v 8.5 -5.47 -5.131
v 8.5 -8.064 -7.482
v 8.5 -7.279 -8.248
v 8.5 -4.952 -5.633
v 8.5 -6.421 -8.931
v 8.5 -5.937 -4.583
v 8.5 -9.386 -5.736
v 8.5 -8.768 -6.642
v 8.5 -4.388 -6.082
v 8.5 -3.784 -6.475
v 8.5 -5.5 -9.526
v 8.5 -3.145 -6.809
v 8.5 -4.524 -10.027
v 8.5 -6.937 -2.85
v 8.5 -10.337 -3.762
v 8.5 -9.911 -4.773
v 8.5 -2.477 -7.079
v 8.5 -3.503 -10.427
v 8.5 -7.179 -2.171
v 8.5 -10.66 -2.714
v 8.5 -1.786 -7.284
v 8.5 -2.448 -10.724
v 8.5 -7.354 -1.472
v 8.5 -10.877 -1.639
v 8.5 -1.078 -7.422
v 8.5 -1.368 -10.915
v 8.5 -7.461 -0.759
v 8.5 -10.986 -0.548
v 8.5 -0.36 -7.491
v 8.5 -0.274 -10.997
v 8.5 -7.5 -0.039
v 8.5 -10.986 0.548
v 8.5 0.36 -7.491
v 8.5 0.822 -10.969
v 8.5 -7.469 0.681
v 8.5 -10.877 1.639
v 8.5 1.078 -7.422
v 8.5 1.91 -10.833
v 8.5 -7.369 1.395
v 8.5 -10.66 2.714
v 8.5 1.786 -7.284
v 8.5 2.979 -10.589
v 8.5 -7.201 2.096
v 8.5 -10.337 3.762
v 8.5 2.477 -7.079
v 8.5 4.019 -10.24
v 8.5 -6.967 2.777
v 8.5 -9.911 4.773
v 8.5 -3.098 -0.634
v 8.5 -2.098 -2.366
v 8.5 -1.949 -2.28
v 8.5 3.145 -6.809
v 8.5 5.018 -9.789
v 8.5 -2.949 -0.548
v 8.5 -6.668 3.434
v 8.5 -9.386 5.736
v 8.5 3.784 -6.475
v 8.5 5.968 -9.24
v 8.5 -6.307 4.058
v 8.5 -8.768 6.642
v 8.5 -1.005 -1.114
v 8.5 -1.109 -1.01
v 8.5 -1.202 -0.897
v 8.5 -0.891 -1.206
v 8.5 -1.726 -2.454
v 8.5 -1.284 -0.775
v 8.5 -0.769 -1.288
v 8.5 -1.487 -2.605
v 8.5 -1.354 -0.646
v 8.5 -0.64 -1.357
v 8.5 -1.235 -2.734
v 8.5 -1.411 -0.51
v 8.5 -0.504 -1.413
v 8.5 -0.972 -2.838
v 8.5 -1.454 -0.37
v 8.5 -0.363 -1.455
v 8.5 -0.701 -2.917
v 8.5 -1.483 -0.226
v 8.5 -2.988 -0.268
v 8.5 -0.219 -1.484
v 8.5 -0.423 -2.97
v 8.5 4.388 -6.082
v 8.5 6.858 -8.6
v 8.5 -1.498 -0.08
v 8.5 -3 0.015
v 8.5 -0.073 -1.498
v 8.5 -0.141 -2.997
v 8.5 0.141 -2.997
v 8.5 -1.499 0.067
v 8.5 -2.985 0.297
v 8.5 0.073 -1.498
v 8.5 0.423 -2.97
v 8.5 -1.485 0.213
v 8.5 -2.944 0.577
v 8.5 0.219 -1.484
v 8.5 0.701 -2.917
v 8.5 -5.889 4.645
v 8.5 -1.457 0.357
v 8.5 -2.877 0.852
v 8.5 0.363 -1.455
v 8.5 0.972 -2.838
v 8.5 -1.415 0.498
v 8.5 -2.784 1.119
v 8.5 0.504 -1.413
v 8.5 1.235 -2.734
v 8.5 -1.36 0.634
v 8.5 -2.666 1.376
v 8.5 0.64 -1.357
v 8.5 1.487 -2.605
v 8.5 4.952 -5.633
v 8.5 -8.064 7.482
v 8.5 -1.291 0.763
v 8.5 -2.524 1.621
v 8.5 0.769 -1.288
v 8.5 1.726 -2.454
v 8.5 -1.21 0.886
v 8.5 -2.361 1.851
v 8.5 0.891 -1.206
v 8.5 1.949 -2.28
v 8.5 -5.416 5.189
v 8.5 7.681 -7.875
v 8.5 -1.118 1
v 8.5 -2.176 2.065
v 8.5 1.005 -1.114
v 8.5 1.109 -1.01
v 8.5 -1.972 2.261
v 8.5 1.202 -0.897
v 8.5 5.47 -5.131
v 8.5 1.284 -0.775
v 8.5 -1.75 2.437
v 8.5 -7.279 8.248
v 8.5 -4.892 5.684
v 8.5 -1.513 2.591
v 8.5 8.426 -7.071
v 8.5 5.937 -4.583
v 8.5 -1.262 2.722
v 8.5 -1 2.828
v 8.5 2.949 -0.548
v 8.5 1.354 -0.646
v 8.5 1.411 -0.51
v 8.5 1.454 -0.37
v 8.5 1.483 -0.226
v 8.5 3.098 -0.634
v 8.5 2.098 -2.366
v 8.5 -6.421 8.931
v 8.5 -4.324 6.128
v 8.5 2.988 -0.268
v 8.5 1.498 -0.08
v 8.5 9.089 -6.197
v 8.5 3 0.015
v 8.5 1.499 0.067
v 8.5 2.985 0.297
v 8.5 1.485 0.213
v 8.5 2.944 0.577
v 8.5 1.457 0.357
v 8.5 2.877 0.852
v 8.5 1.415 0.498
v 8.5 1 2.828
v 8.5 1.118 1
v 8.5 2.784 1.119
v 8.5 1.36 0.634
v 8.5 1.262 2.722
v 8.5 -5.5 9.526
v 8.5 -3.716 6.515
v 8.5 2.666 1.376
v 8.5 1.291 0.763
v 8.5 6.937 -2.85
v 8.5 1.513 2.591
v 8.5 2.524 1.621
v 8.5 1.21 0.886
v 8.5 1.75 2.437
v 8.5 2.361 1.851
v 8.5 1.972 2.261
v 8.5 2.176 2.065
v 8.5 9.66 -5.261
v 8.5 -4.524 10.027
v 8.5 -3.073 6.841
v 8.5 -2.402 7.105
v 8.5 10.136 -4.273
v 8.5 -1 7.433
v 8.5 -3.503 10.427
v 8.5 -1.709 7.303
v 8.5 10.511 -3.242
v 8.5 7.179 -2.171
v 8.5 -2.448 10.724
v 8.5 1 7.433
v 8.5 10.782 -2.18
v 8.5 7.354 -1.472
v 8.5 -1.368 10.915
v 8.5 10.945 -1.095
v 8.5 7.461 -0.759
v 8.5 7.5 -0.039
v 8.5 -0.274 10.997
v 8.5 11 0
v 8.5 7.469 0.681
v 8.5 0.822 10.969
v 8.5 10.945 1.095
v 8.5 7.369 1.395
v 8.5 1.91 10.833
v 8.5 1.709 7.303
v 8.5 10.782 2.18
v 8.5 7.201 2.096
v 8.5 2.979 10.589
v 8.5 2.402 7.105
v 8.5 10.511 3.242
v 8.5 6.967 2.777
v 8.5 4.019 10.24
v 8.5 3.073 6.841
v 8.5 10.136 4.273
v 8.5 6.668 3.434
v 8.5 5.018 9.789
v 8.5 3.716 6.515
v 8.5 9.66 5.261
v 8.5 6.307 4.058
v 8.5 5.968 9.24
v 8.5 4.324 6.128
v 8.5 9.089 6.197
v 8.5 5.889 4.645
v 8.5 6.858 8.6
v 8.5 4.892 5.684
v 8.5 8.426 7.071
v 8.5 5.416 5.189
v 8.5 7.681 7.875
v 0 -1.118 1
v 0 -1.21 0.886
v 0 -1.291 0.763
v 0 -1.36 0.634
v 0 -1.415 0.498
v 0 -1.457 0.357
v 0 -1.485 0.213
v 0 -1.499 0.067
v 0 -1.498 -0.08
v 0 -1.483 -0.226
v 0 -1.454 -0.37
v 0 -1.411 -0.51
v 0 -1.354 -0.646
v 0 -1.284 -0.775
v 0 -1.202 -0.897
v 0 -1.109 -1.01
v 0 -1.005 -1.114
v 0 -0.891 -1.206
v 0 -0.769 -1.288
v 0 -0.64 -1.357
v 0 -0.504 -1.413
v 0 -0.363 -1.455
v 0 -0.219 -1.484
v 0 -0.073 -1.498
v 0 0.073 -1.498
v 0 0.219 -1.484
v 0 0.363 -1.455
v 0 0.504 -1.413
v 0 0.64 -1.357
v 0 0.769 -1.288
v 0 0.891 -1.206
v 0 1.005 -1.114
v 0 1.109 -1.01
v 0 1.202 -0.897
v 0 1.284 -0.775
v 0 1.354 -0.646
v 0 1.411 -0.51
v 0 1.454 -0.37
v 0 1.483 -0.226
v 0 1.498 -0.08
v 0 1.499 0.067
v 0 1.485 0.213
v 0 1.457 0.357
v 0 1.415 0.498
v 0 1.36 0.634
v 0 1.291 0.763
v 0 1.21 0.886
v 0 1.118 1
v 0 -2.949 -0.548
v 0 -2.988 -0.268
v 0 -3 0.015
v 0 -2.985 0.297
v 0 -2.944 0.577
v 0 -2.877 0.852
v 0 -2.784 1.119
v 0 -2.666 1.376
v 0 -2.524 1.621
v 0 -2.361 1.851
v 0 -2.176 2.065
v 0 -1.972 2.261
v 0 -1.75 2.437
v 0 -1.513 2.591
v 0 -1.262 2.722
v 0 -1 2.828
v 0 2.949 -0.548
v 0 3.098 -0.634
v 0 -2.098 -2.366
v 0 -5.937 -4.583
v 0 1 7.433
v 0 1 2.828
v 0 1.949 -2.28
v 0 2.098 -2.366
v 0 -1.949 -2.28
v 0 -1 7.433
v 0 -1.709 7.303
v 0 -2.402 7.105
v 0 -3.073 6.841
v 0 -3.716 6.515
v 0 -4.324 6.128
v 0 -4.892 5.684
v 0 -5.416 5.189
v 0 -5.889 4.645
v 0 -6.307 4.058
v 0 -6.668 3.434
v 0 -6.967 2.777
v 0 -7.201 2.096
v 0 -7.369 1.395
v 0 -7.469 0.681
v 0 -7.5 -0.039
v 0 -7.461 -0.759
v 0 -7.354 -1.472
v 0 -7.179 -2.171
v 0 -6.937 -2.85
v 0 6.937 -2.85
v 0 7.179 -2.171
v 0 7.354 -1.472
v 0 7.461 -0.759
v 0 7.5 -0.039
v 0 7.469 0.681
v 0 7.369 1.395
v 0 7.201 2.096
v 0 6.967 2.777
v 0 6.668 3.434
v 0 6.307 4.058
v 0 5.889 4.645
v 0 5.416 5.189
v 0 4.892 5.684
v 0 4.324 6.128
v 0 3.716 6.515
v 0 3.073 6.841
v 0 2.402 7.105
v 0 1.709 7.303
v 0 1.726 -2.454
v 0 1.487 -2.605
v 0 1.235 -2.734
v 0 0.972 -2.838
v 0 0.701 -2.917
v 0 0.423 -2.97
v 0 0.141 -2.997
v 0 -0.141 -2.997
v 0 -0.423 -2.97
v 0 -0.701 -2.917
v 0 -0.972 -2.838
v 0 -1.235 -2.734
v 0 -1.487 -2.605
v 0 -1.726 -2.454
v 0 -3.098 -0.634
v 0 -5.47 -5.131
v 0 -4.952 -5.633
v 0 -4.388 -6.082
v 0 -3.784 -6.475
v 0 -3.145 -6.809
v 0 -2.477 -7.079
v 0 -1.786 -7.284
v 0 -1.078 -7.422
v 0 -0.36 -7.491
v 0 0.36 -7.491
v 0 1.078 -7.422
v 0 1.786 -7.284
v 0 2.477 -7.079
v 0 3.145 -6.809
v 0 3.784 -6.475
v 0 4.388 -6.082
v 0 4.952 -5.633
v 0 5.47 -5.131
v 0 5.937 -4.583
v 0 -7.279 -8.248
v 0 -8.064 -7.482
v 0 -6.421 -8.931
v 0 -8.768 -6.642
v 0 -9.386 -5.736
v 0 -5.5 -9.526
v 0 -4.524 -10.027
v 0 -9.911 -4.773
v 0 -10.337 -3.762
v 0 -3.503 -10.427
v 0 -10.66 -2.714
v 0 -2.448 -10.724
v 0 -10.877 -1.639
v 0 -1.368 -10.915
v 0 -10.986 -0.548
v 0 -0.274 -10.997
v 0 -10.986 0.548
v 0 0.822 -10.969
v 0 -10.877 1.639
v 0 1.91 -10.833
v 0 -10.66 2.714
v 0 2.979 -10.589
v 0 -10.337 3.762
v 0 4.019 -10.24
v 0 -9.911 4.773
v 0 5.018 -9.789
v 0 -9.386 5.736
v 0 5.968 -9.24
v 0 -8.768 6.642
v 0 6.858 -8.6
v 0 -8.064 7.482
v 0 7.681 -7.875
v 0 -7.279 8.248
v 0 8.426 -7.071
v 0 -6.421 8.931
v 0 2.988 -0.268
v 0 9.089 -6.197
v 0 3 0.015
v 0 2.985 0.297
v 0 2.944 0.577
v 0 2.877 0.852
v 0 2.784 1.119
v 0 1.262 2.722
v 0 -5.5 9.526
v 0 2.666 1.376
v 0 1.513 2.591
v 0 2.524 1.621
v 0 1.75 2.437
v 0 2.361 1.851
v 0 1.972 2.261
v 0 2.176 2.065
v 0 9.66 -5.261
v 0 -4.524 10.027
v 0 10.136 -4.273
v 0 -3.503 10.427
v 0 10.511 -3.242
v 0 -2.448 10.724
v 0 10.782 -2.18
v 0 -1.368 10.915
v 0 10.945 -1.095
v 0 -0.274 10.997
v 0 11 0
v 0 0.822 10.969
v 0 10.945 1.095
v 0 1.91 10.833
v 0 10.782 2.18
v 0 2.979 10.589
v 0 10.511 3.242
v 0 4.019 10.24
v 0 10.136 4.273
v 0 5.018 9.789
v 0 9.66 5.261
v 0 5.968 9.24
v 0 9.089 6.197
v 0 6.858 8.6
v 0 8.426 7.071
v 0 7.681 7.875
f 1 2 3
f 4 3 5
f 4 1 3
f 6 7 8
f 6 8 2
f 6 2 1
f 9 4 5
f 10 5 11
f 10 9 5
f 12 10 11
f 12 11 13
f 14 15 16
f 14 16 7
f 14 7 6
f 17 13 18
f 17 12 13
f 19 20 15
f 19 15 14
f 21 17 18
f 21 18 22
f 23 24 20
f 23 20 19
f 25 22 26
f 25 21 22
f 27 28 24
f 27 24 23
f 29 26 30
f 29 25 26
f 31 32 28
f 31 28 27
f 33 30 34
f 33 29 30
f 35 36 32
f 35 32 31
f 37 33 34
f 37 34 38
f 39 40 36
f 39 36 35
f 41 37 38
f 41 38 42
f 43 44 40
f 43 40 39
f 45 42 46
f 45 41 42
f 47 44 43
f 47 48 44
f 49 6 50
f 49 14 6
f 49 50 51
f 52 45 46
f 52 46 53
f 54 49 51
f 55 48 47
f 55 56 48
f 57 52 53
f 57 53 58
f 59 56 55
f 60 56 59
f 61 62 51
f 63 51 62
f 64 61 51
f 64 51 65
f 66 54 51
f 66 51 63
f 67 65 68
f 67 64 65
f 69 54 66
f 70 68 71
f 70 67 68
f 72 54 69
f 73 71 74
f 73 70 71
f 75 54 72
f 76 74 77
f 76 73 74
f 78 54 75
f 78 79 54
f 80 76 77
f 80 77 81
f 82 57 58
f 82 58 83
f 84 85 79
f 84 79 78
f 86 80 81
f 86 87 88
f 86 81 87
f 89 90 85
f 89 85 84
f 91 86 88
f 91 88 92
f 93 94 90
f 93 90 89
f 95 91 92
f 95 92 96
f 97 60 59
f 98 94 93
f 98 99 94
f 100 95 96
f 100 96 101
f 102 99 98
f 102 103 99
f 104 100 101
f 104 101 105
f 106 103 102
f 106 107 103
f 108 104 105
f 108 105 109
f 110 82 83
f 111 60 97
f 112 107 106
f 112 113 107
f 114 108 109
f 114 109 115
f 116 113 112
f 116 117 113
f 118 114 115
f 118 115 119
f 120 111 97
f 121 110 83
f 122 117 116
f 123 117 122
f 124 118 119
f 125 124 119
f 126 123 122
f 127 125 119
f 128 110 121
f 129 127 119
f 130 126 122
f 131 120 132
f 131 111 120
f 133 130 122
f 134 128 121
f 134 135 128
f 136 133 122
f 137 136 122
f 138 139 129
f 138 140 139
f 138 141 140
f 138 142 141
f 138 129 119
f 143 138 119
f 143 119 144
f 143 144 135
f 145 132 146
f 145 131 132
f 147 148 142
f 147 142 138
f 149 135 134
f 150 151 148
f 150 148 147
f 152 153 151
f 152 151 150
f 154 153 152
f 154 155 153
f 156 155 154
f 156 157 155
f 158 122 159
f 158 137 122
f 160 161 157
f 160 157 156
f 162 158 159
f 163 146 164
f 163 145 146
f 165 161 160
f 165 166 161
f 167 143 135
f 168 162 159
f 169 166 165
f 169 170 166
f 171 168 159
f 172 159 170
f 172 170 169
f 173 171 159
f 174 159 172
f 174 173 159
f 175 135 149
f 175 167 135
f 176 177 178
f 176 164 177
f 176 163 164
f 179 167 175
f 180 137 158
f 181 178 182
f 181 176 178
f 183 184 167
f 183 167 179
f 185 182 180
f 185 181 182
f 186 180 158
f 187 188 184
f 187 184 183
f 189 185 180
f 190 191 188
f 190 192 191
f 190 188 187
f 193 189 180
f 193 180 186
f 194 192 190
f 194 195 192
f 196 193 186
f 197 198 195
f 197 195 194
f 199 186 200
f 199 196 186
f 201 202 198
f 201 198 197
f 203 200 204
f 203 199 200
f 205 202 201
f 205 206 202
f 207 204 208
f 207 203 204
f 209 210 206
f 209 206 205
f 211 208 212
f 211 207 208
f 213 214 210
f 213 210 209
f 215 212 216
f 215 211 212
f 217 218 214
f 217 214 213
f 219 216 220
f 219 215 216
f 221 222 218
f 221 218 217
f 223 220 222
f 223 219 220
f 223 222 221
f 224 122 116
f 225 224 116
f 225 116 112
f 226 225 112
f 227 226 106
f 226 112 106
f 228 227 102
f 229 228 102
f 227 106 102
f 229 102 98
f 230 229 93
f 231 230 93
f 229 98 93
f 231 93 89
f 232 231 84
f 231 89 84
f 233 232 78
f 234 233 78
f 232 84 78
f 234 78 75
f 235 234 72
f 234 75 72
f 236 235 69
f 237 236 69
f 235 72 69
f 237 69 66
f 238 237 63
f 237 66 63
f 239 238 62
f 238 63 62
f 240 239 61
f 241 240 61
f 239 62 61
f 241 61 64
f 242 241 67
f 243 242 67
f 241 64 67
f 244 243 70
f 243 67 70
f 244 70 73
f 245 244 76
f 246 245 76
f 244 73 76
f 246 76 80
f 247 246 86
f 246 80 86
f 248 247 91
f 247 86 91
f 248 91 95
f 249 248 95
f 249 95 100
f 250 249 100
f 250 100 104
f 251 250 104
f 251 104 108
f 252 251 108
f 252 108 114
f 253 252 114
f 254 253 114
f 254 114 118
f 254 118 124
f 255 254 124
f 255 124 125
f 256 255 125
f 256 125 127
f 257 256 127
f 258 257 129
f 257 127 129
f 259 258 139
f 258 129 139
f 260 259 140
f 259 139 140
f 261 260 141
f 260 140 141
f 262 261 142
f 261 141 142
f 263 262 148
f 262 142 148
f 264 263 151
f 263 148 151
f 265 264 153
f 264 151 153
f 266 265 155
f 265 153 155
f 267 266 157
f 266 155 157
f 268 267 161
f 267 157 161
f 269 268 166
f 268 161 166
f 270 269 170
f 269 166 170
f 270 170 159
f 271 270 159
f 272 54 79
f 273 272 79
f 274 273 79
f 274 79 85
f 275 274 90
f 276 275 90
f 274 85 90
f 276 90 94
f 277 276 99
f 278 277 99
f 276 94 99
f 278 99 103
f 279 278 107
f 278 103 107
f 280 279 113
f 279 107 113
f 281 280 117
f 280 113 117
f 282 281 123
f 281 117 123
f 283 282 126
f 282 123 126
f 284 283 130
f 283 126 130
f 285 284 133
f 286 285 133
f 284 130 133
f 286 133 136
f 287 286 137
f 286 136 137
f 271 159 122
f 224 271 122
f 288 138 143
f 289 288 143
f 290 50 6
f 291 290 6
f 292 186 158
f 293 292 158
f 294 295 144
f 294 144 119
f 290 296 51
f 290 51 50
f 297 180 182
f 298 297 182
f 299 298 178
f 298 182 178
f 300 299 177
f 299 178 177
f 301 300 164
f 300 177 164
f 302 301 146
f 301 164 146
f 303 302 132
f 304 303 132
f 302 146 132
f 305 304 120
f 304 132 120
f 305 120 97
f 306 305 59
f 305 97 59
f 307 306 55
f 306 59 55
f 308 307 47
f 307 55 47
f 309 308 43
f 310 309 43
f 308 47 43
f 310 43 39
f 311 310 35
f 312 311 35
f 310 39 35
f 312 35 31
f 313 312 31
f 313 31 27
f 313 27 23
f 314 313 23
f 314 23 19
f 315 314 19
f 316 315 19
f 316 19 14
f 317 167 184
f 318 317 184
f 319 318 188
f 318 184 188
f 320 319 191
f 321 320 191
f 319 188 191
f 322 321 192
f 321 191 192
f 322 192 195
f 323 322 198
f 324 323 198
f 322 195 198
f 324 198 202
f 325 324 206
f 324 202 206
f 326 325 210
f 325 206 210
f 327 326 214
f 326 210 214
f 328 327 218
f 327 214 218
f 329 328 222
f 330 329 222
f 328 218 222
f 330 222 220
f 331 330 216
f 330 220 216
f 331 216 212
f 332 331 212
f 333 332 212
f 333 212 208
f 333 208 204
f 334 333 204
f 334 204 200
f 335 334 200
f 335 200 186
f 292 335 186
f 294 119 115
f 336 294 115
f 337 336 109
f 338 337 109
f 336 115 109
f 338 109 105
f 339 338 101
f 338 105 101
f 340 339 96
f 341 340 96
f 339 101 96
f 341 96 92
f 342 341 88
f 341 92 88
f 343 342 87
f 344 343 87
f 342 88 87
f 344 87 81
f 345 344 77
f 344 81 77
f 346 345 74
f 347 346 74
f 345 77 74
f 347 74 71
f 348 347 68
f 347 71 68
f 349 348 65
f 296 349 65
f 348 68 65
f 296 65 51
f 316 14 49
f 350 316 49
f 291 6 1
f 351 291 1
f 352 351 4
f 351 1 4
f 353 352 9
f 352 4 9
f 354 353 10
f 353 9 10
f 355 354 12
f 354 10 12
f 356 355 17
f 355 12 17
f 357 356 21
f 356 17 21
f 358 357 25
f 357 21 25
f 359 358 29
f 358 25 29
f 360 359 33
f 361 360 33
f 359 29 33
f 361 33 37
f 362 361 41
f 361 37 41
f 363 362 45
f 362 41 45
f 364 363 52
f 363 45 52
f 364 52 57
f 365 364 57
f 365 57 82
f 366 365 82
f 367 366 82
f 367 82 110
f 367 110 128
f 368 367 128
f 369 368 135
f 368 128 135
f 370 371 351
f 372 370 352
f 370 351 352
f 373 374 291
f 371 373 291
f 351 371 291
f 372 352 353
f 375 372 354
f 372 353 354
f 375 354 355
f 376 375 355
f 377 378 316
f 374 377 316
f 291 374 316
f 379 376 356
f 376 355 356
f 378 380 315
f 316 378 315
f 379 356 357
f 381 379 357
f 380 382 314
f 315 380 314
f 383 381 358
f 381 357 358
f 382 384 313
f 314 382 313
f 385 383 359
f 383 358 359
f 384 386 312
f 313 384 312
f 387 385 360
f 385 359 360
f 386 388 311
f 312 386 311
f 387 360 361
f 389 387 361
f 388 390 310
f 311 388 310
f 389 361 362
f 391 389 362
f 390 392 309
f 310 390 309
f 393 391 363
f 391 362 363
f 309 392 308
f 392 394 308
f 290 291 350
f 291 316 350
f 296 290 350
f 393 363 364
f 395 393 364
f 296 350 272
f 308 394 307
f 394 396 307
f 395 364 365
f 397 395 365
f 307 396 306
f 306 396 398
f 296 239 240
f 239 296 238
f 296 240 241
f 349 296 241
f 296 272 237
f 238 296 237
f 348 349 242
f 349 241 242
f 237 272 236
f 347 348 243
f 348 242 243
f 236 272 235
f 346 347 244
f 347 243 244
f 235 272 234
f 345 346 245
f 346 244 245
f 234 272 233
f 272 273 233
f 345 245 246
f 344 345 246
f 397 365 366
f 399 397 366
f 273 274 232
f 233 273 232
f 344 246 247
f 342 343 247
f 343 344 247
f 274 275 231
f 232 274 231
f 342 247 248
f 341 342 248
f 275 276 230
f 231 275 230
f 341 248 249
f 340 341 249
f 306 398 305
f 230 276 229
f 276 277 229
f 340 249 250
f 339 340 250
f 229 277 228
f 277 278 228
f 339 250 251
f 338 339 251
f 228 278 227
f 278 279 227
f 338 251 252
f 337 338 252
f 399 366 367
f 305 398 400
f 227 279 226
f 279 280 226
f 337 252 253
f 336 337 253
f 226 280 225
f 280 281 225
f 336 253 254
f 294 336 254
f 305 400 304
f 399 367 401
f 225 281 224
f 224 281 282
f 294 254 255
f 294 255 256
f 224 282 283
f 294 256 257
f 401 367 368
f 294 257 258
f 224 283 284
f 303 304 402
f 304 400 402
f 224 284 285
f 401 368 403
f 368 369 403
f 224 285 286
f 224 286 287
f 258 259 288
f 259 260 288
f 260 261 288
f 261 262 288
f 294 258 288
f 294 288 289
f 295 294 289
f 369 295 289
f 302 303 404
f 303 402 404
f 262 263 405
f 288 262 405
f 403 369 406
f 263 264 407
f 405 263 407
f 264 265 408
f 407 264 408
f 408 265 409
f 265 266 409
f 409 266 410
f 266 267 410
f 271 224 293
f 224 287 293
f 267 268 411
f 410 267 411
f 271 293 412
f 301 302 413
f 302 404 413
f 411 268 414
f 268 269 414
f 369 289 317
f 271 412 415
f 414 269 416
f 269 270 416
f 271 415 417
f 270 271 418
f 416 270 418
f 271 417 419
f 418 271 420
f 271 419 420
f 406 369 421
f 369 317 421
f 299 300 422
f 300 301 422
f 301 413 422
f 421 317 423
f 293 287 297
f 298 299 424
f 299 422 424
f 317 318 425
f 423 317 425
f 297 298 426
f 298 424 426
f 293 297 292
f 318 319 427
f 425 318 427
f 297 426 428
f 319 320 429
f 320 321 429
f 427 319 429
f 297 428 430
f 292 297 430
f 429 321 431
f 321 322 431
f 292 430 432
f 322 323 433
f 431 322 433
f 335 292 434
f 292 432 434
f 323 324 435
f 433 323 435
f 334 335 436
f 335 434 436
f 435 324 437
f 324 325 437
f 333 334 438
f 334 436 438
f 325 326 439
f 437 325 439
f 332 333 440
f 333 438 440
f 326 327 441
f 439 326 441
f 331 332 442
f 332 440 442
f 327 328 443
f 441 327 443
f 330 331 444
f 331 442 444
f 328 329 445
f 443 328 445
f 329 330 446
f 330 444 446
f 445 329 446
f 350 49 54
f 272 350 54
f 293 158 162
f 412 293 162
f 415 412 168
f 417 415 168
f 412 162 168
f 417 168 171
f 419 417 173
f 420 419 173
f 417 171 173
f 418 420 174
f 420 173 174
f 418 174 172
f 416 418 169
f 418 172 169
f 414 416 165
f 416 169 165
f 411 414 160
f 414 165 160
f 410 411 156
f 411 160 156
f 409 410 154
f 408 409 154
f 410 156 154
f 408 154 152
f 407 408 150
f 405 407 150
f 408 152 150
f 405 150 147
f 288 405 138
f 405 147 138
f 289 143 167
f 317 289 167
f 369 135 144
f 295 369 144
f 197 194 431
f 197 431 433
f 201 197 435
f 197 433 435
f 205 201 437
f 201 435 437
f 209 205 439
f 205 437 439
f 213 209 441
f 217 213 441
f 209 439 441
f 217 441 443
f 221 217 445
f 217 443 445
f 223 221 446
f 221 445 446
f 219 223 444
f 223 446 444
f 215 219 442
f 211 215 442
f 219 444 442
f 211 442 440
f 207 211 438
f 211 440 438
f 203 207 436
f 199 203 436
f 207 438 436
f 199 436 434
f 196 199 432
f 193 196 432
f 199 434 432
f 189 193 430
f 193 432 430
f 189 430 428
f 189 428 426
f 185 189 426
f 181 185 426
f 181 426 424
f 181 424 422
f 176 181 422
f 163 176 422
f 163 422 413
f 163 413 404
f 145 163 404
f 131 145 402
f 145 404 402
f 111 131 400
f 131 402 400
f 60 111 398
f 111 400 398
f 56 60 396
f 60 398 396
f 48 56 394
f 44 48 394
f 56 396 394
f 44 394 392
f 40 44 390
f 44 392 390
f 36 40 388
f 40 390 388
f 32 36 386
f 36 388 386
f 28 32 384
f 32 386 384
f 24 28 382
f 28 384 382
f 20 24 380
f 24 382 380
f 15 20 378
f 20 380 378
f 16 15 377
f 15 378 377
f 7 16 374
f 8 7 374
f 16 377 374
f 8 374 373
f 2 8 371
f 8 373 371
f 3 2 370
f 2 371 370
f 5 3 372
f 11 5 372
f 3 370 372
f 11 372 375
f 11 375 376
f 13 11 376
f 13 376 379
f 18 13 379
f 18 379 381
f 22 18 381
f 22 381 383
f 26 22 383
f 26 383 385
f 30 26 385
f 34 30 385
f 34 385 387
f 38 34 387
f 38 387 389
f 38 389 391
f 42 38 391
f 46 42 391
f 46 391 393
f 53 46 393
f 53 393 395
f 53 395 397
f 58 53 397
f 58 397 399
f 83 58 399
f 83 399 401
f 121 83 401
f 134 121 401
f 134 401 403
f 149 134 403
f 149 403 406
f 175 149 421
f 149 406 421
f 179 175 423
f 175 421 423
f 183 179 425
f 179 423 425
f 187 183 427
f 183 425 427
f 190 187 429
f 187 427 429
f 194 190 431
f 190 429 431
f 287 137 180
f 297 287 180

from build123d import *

# Parameters (mm, degrees)
F0_R     = 11
F1_DEPTH = 8.5
F3_DEPTH = 8.5
F5_DEPTH = 8.5


with BuildPart() as f1:
    # F0 (on Right) → F1 (new body)
    with BuildSketch(Plane.YZ):
        Circle(F0_R)
    extrude(amount=F1_DEPTH)

    # F2 (on face) → F3 (cut, through all)
    with BuildSketch(Plane.YZ.offset(8.5)):
        with BuildLine():
            Line((-1, 3), (-1, 7.433034))
            ThreePointArc((-1, 7.433034), (-6.495191, 3.75), (-6.937197, -2.850492))
            Line((-6.937197, -2.850492), (-3.098076, -0.633975))
            Line((-3.098076, -0.633975), (-2.94949, -0.548188))
            ThreePointArc((-2.94949, -0.548188), (-2.598076, 1.5), (-1, 2.828427))
            Line((-1, 2.828427), (-1, 3))
        make_face()
        with BuildLine():
            Line((1, 3.171573), (1, 3))
            Line((1, 3), (1, 2.828427))
            ThreePointArc((1, 2.828427), (2.598076, 1.5), (2.94949, -0.548188))
            Line((2.94949, -0.548188), (3.098076, -0.633975))
            Line((3.098076, -0.633975), (6.937197, -2.850492))
            ThreePointArc((6.937197, -2.850492), (6.495191, 3.75), (1, 7.433034))
            Line((1, 7.433034), (1, 3.171573))
        make_face()
        with BuildLine():
            Line((-1.94949, -2.280239), (-2.098076, -2.366025))
            Line((-2.098076, -2.366025), (-5.937197, -4.582543))
            ThreePointArc((-5.937197, -4.582543), (0, -7.5), (5.937197, -4.582543))
            Line((5.937197, -4.582543), (2.098076, -2.366025))
            Line((2.098076, -2.366025), (1.94949, -2.280239))
            ThreePointArc((1.94949, -2.280239), (0, -3), (-1.94949, -2.280239))
        make_face()
    extrude(amount=-F3_DEPTH, mode=Mode.SUBTRACT)

    # F4 (on face) → F5 (cut, through all)
    with BuildSketch(Plane.YZ.offset(8.5)):
        with BuildLine():
            Line((1.118034, 1), (-1.118034, 1))
            ThreePointArc((-1.118034, 1), (0, -1.5), (1.118034, 1))
        make_face()
    extrude(amount=-F5_DEPTH, mode=Mode.SUBTRACT)


solid = f1.part
